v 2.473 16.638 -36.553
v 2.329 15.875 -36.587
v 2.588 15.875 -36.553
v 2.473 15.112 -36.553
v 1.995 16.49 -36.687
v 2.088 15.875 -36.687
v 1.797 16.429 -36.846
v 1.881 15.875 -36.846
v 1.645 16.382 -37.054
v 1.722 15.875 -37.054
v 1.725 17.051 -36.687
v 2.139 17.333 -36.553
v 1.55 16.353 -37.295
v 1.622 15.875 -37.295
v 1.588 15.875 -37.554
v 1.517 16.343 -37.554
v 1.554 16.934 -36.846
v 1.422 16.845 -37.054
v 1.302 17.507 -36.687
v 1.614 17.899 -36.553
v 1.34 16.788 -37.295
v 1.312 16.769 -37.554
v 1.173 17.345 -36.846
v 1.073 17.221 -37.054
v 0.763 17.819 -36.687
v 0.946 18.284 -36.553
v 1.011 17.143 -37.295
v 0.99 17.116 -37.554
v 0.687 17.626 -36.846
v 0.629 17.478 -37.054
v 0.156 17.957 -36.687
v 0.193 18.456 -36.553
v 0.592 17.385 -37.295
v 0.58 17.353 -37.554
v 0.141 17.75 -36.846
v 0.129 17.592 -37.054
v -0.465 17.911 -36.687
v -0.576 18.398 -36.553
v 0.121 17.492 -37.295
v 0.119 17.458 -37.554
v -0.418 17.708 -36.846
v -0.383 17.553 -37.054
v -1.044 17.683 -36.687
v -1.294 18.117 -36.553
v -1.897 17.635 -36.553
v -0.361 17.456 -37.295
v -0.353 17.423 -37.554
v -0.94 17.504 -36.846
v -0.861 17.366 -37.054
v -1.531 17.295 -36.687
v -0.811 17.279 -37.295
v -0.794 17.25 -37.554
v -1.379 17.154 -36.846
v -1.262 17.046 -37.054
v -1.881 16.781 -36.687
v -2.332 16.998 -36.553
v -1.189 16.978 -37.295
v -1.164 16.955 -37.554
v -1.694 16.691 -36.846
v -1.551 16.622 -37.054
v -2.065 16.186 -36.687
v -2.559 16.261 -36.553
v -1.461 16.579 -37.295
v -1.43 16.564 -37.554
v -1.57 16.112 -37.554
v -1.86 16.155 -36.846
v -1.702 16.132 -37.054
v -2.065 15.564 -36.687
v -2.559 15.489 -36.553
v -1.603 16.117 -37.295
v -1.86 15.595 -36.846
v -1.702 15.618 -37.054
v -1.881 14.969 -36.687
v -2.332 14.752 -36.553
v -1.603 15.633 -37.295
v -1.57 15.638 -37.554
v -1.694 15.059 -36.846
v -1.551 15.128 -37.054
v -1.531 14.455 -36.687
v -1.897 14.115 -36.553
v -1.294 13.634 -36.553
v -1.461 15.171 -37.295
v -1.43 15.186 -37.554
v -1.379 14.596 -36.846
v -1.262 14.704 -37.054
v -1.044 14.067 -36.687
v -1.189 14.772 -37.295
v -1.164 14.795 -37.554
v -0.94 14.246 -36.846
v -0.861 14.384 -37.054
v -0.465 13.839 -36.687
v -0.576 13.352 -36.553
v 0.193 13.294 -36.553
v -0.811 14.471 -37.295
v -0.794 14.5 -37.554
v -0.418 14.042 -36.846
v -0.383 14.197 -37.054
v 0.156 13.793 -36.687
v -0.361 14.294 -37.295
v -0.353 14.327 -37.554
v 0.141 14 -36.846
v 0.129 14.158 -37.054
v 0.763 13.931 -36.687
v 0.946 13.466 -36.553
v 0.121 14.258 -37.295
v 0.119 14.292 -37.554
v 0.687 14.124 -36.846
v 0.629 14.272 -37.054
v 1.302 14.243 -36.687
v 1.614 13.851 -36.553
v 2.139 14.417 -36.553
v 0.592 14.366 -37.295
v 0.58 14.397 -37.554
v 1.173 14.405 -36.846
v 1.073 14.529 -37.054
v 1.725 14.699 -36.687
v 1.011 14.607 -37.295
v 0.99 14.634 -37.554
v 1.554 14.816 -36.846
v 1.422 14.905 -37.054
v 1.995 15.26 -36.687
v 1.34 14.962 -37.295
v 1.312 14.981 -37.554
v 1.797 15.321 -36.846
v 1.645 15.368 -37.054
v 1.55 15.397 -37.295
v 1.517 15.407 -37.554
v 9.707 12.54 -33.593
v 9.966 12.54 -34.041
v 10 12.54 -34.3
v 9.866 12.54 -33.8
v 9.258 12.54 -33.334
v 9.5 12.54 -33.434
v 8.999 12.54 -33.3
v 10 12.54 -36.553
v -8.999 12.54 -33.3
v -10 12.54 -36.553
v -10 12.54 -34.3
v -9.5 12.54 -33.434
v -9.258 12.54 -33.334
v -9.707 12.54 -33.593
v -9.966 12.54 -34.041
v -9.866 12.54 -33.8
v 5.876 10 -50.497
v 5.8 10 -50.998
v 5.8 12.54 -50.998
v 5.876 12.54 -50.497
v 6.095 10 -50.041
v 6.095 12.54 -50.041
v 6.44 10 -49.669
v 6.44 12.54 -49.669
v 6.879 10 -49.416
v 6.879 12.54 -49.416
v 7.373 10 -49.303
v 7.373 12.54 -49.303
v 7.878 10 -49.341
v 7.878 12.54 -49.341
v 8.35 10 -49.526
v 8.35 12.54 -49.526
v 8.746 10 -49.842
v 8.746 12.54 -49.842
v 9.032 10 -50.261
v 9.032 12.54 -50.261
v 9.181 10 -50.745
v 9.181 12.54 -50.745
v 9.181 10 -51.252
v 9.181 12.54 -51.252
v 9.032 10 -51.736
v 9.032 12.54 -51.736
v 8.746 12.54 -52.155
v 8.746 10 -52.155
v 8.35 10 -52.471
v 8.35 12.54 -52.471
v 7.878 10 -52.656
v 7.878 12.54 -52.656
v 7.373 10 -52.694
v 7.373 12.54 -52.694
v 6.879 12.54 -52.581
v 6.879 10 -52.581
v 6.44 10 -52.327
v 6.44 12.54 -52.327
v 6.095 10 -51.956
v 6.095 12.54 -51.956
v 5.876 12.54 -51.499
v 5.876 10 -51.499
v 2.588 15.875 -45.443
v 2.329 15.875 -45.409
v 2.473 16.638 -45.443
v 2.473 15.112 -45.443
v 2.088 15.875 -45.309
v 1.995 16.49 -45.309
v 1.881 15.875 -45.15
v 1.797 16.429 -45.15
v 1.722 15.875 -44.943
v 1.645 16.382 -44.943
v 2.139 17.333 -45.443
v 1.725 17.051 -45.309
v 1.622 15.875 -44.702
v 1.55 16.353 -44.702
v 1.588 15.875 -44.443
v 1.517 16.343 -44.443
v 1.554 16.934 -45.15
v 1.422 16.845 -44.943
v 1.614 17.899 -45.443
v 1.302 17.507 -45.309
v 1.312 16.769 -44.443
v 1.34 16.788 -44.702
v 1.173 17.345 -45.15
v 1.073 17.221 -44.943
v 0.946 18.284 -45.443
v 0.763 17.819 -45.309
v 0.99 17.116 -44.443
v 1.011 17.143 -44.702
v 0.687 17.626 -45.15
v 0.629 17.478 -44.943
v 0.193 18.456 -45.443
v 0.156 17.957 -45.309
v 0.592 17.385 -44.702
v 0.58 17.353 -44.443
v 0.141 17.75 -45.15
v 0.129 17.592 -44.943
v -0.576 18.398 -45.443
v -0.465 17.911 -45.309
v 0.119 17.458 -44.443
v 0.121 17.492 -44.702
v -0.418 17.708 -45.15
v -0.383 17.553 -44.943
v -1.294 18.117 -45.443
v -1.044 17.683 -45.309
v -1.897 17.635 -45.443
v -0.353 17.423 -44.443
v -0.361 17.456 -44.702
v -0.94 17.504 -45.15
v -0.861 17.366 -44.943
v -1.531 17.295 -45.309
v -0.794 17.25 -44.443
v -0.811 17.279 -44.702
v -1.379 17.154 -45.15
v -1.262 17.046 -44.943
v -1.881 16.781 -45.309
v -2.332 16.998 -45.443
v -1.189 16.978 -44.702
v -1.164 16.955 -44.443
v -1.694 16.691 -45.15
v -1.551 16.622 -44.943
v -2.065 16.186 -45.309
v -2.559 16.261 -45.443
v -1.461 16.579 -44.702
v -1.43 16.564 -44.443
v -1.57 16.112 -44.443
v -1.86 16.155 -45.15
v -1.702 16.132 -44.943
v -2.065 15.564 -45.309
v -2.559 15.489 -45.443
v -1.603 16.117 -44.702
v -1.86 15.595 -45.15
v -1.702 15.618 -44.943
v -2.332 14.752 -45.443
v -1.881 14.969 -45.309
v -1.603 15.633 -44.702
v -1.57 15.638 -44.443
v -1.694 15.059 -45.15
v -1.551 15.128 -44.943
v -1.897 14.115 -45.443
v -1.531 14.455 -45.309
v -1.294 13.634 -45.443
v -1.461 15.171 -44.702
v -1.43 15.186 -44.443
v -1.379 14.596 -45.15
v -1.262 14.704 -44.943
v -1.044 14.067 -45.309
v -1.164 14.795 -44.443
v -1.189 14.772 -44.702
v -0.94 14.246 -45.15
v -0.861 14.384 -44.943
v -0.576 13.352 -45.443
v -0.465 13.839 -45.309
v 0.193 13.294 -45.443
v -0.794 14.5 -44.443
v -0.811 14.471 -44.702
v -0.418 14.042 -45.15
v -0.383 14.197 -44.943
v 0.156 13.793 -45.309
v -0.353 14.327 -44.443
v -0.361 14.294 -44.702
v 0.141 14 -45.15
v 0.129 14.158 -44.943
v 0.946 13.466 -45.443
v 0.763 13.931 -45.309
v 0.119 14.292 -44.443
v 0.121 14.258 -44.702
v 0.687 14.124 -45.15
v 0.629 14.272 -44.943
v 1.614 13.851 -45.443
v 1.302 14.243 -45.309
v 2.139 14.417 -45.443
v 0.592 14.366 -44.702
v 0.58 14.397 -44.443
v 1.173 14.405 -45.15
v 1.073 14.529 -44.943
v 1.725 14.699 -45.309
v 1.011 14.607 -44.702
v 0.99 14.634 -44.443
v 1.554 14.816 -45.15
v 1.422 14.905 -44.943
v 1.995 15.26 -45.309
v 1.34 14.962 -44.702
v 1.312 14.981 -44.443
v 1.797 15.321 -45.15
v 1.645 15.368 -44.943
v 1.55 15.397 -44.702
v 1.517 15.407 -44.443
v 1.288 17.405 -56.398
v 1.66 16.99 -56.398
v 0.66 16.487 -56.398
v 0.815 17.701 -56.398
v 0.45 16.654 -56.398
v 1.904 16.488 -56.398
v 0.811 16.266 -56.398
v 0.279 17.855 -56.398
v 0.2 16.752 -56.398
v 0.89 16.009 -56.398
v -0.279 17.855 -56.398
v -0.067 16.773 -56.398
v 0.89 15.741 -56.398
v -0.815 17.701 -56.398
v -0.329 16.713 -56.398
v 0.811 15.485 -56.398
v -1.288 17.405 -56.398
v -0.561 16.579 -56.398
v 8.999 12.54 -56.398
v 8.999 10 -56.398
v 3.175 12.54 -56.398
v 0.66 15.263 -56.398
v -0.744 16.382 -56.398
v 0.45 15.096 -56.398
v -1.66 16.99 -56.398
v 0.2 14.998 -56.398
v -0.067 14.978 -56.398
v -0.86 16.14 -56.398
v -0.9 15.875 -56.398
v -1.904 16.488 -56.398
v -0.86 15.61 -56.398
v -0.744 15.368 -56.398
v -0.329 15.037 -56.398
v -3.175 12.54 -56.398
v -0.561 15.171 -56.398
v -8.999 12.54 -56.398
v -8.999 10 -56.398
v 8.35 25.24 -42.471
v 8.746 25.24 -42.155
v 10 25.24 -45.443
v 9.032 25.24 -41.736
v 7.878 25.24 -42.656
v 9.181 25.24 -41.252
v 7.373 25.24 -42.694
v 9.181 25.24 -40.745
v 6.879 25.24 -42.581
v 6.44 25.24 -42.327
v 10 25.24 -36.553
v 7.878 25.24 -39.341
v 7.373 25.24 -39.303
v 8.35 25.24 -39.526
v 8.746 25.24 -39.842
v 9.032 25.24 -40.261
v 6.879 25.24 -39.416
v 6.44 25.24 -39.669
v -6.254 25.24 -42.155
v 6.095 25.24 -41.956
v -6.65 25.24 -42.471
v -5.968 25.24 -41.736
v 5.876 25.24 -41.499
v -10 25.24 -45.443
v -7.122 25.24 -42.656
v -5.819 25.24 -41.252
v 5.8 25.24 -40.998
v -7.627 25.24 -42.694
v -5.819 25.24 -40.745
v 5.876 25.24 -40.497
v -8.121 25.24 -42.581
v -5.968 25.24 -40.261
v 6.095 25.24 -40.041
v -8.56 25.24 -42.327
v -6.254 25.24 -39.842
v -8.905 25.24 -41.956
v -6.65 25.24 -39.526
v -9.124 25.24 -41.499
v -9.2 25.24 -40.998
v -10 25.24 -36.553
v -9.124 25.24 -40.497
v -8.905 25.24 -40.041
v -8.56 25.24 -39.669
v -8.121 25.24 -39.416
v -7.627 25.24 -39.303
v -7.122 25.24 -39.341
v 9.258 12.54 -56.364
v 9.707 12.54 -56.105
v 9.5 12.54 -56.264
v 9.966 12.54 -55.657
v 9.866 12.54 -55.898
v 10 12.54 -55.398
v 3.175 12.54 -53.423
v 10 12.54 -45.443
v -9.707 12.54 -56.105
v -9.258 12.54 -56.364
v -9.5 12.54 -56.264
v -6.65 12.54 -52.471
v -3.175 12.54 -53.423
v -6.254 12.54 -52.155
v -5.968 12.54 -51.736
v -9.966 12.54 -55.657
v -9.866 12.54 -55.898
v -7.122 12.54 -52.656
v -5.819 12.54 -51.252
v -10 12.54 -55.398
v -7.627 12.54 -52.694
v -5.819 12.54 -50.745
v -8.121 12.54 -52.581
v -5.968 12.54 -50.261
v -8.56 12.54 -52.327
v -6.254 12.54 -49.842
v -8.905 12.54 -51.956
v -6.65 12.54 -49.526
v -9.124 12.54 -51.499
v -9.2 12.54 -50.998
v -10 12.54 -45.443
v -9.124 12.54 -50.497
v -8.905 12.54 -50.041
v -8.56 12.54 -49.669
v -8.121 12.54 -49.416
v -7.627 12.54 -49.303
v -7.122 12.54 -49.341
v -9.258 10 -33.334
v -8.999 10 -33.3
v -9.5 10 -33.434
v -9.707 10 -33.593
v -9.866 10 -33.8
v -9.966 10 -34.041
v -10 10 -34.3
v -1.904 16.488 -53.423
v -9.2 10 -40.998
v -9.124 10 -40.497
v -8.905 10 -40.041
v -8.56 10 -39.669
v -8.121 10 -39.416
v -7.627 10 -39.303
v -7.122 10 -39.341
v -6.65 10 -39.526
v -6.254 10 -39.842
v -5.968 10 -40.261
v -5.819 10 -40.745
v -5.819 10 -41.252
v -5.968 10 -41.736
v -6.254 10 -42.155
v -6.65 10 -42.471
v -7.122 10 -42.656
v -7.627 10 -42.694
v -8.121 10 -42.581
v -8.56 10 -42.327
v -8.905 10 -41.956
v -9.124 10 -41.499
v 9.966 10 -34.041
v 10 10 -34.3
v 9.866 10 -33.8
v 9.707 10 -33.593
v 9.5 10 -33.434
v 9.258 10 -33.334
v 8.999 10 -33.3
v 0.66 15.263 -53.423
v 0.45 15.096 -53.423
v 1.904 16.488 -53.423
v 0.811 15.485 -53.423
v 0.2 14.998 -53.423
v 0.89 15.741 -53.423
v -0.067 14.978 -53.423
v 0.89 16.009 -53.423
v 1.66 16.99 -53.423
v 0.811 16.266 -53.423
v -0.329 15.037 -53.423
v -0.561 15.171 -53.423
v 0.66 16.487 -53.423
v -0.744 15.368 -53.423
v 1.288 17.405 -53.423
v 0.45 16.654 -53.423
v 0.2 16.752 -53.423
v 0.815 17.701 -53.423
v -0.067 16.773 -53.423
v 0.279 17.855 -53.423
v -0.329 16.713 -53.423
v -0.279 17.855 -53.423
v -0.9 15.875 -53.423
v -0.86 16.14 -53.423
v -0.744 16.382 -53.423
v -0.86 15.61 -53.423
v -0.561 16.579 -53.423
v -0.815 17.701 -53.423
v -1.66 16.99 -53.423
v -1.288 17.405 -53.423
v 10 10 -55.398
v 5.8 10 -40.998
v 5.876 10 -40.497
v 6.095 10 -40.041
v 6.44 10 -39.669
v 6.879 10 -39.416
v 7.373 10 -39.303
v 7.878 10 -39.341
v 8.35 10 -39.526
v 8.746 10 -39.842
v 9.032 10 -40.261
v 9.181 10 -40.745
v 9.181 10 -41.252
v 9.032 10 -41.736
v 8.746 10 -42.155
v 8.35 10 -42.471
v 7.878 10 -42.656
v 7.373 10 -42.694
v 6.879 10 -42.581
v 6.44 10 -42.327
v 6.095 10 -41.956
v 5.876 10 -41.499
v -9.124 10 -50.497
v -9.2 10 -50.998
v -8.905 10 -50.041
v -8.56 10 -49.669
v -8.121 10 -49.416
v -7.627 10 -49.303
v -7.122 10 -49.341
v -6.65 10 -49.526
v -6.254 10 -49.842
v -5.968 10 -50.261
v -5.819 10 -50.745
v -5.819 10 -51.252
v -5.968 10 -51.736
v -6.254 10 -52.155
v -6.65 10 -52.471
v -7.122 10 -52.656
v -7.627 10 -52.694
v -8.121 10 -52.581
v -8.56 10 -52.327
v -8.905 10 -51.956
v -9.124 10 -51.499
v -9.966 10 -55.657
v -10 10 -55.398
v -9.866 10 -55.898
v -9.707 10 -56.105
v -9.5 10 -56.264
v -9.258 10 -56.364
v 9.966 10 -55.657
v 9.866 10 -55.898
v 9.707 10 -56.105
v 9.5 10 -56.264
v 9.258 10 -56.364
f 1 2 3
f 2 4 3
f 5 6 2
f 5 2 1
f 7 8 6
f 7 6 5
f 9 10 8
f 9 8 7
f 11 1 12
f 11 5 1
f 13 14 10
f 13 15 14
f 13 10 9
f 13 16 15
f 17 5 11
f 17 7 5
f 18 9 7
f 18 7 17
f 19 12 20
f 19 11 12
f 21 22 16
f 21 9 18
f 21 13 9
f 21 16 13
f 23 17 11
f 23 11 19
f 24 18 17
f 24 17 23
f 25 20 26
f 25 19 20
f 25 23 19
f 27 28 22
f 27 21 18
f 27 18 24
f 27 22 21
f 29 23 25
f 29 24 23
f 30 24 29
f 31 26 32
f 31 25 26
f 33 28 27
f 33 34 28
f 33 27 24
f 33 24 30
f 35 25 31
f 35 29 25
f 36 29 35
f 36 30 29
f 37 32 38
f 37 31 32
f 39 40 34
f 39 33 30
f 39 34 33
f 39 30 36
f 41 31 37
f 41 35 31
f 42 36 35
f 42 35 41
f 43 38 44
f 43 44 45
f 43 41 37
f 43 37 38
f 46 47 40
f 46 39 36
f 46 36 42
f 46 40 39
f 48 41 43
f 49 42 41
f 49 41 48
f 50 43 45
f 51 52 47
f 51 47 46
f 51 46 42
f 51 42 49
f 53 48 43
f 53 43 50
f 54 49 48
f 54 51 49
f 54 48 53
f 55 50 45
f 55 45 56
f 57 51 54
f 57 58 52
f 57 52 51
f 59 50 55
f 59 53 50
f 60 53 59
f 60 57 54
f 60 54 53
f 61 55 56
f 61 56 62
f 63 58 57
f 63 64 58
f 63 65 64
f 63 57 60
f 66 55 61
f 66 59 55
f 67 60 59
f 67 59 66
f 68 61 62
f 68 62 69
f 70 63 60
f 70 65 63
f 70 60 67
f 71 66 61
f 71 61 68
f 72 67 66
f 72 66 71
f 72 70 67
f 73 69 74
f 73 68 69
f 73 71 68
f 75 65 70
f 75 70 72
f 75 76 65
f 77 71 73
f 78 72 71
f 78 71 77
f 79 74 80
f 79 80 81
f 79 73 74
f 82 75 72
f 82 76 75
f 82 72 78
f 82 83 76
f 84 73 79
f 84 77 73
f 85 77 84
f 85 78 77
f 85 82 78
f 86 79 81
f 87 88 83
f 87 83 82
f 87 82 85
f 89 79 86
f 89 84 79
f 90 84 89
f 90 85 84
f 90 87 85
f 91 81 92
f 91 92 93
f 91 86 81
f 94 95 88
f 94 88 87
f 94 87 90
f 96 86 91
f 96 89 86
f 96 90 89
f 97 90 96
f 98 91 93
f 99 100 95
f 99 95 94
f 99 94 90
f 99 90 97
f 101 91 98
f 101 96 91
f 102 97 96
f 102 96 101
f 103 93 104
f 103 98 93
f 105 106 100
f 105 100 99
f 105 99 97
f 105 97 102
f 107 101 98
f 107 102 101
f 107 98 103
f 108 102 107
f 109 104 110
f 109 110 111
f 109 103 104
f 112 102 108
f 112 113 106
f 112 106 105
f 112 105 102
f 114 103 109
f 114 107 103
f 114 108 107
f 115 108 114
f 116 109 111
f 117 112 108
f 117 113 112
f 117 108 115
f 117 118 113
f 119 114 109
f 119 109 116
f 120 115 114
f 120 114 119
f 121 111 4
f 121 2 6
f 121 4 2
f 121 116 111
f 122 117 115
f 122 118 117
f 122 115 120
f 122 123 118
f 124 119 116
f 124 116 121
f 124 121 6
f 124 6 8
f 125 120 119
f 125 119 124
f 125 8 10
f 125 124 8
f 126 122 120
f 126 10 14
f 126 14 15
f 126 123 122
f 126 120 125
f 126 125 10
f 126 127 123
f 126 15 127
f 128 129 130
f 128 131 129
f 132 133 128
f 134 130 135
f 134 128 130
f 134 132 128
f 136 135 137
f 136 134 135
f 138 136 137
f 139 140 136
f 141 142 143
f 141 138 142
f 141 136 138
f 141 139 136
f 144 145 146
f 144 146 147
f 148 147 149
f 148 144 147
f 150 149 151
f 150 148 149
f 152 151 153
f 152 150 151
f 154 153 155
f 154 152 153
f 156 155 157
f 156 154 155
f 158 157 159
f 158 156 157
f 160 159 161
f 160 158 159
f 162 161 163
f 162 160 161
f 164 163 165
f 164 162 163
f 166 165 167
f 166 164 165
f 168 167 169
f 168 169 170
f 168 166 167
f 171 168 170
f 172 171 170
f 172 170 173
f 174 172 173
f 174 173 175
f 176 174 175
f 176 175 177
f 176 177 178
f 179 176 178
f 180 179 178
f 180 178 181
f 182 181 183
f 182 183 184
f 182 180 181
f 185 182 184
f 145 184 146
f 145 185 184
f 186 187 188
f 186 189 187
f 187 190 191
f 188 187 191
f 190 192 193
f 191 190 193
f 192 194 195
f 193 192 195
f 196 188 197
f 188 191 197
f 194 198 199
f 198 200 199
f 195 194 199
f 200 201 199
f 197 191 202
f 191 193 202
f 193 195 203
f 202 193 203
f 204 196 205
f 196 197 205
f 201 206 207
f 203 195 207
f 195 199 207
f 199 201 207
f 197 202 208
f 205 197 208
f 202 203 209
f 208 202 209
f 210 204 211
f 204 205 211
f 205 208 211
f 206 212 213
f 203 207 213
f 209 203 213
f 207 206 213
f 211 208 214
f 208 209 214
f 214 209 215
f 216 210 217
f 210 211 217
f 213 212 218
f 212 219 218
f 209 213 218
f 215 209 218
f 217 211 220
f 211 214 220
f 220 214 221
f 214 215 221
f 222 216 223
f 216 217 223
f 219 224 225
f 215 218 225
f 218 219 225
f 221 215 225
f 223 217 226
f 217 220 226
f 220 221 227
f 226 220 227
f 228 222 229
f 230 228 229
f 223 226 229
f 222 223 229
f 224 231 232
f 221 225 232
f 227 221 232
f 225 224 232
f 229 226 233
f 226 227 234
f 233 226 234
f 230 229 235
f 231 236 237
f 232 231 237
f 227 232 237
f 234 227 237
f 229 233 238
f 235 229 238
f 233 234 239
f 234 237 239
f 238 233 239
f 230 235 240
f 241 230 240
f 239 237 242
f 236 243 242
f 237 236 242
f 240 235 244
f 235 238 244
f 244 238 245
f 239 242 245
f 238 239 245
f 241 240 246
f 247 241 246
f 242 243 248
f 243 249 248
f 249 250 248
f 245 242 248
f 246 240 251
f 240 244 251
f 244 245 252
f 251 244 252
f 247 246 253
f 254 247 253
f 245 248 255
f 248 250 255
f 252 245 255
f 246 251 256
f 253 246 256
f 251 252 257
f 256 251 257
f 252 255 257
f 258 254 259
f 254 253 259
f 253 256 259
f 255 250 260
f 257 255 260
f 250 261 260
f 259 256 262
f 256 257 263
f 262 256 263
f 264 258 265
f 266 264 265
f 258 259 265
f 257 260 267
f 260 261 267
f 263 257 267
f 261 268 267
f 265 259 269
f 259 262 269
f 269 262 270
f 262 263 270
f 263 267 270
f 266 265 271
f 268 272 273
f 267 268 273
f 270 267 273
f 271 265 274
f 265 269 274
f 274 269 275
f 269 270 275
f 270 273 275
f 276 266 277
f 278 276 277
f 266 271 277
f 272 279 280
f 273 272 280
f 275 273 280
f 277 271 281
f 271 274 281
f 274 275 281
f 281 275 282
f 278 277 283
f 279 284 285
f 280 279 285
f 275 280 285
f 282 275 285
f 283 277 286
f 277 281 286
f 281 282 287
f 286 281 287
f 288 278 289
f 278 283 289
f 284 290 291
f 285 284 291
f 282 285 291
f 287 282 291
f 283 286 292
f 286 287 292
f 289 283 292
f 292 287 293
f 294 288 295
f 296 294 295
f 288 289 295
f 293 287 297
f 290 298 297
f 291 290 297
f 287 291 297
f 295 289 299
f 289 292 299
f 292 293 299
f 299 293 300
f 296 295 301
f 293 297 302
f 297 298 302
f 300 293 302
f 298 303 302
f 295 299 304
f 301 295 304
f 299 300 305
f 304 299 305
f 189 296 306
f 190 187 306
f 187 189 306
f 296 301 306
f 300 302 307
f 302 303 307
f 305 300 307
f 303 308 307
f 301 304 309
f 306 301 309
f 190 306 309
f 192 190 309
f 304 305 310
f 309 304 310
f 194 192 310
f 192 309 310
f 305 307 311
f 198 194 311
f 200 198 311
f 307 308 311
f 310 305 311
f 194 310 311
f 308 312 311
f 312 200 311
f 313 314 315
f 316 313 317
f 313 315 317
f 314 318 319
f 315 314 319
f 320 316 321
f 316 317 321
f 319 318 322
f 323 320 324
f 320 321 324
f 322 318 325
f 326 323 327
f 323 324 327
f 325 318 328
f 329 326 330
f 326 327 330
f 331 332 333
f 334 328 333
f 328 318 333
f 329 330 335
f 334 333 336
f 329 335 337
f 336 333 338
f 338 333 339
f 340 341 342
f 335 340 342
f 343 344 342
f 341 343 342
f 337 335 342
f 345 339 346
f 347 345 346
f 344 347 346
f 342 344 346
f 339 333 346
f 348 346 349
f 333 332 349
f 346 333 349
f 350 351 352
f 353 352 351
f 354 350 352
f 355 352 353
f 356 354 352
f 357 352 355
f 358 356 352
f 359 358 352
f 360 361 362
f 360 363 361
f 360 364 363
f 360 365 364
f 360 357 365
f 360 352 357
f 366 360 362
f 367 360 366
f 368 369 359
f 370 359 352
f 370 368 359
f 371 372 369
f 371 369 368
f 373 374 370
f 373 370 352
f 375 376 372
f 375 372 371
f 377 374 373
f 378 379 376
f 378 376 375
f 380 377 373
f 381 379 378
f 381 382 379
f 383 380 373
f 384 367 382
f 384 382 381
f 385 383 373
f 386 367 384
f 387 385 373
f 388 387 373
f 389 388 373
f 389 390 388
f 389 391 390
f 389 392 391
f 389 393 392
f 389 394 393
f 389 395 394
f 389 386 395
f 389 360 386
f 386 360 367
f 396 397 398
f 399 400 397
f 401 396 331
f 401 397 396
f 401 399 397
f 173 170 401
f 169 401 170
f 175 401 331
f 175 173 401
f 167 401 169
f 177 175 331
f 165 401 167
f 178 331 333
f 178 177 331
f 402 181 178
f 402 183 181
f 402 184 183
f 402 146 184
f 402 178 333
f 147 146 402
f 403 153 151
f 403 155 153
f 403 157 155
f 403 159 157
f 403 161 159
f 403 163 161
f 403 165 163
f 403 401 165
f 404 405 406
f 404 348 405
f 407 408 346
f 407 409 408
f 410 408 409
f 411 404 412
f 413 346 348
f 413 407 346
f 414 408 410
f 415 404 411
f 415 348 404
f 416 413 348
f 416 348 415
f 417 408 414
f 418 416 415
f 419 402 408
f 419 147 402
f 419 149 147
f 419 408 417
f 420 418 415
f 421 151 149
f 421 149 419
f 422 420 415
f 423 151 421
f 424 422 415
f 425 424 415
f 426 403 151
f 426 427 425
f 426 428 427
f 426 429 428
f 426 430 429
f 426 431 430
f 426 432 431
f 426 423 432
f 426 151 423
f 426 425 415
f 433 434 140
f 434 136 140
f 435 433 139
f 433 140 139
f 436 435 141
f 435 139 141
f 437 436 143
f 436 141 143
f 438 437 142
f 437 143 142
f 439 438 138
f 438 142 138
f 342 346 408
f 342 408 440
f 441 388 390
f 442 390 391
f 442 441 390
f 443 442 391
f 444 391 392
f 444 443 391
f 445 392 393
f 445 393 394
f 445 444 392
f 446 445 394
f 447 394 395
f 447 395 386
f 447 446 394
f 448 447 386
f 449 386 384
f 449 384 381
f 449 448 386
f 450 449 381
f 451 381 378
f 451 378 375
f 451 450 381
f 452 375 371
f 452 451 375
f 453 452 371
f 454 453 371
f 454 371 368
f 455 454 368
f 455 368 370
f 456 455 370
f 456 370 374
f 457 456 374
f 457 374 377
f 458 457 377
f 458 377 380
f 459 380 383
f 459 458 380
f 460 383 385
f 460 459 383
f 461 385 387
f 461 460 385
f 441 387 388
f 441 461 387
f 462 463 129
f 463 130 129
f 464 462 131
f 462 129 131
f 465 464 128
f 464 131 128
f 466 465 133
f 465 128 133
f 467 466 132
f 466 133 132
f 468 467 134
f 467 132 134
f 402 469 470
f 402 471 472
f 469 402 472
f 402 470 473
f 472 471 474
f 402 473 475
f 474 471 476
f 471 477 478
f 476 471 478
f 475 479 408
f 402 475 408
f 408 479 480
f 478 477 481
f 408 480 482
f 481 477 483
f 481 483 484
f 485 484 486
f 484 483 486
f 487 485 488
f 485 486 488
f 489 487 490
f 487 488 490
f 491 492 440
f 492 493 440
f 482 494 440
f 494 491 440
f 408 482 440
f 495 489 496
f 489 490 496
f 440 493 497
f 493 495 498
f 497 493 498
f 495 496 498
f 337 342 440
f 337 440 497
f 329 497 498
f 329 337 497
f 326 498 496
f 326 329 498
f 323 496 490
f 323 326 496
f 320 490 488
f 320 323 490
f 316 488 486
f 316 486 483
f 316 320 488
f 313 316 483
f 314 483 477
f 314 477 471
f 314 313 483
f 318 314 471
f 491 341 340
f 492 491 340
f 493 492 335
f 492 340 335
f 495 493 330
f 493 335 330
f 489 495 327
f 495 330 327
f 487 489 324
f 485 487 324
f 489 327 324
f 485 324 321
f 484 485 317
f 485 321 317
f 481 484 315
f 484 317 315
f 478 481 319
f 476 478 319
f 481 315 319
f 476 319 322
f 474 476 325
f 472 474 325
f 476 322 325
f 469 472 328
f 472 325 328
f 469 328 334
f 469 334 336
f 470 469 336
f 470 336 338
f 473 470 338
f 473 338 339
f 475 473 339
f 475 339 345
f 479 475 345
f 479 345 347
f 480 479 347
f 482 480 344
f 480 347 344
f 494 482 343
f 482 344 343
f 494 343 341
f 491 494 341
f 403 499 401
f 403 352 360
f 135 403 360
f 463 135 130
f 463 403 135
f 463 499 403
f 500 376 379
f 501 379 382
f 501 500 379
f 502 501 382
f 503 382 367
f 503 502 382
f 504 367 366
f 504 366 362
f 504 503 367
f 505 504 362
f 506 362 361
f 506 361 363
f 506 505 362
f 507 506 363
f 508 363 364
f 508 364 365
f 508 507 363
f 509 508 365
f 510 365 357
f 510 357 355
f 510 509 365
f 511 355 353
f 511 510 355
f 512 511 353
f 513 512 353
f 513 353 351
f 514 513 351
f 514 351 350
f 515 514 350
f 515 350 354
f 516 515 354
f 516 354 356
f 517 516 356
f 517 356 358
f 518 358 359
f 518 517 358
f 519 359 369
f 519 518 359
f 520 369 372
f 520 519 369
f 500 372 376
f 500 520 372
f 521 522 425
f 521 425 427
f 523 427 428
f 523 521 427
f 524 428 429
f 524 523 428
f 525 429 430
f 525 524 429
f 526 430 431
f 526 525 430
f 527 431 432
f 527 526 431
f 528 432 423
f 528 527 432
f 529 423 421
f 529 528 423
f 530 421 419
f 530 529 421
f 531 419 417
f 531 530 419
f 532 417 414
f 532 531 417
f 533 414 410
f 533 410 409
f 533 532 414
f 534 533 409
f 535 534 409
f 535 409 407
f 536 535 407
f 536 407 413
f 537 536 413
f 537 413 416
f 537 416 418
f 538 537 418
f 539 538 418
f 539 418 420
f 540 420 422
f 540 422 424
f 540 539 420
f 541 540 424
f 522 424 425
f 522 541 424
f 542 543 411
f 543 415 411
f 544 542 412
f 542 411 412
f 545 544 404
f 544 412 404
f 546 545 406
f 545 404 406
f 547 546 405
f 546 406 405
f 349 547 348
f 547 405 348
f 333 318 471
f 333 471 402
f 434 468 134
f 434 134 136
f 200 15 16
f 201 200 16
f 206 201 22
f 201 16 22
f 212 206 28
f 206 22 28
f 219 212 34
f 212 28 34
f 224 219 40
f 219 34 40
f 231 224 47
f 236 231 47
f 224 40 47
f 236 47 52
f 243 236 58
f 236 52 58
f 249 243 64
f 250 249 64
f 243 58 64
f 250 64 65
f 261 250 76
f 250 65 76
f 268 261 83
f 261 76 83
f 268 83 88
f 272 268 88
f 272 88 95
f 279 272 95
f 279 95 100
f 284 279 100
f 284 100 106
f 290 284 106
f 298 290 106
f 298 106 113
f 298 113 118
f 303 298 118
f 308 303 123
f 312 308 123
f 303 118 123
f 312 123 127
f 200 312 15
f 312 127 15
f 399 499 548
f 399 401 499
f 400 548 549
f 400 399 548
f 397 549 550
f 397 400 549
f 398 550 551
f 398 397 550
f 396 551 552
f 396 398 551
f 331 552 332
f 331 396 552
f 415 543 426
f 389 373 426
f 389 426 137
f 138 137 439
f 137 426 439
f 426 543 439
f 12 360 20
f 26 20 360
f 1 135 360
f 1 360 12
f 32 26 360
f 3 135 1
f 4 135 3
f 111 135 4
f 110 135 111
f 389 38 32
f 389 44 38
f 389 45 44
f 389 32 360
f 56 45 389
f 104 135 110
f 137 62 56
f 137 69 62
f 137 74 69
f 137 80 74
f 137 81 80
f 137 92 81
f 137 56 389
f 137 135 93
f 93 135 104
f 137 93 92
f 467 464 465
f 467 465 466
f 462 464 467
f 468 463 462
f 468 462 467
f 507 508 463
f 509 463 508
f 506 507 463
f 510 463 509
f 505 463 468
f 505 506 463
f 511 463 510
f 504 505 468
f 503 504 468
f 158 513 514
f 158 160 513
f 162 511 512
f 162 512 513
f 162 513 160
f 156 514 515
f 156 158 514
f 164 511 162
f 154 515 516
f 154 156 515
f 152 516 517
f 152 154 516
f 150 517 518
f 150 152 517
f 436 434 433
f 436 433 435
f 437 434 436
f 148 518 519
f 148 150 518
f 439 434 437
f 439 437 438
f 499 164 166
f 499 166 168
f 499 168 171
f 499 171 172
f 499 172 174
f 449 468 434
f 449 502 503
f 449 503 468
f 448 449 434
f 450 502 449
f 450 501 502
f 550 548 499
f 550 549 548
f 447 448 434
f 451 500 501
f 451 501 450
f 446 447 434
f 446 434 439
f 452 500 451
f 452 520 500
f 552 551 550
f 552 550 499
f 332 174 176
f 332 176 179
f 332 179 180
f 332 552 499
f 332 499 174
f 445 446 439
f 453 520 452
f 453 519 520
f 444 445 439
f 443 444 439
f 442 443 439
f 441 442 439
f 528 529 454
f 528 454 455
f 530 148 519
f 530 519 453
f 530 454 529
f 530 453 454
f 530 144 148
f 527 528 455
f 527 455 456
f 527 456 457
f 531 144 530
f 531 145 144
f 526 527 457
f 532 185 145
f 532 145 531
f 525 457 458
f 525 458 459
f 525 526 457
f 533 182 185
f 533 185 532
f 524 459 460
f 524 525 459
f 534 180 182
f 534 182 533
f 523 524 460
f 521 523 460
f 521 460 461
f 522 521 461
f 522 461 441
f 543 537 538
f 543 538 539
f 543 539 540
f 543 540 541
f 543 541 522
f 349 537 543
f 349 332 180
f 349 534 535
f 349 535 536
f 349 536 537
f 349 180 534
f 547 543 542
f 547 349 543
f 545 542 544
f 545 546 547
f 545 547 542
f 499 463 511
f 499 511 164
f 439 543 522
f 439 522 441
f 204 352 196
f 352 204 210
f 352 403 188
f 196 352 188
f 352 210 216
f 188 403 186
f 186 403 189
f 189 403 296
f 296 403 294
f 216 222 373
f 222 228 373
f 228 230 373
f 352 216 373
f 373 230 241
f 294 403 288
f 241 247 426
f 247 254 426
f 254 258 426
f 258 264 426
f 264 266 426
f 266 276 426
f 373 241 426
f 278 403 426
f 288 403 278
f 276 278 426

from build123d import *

# Parameters (mm, degrees)
SKETCH036_W  = 19.99996
SKETCH036_H  = 23.09876
SKETCH036_R  = 1.7
PAD003_DEPTH = 2.54
SKETCH051_W  = 19.99996
SKETCH051_H  = 8.89
SKETCH051_R  = 1.7
PAD_DEPTH    = 12.7
SKETCH050_R  = 0.9
PAD011_DEPTH = 2.975
SKETCH_R     = 1.5875
POCKET_DEPTH = 8.89
FILLET_R     = 1.00076


with BuildPart() as part:
    # Sketch036 → Pad003 (new body)
    with BuildSketch(Plane(origin=(0, 10, -45.999574), x_dir=(-1, 0, 0), z_dir=(0, 1, 0))):
        with Locations((0, 1.15062)):
            Rectangle(SKETCH036_W, SKETCH036_H)
        with Locations((-7.5, 5.00124)):
            Circle(SKETCH036_R, mode=Mode.SUBTRACT)
        with Locations((-7.5, -4.99876)):
            Circle(SKETCH036_R, mode=Mode.SUBTRACT)
        with Locations((7.5, -4.99876)):
            Circle(SKETCH036_R, mode=Mode.SUBTRACT)
        with Locations((7.5, 5.00124)):
            Circle(SKETCH036_R, mode=Mode.SUBTRACT)
    extrude(amount=PAD003_DEPTH)

    # Sketch051 (on Face10 of Pad003) → Pad (join)
    with BuildSketch(Plane(origin=(0, 12.54, -45.999574), x_dir=(-1, 0, 0), z_dir=(0, 1, 0))):
        with Locations((0, 5.00124)):
            Rectangle(SKETCH051_W, SKETCH051_H)
        with Locations((-7.5, 5.00124)):
            Circle(SKETCH051_R, mode=Mode.SUBTRACT)
        with Locations((7.5, 5.00124)):
            Circle(SKETCH051_R, mode=Mode.SUBTRACT)
    extrude(amount=PAD_DEPTH)

    # Sketch050 → Pad011 (join)
    with BuildSketch(Plane(origin=(0, 10, -56.398334), x_dir=(-1, 0, 0), z_dir=(0, 0, -1))):
        with BuildLine():
            Line((-3.175, 2.54), (-3.175, 0))
            Line((-3.175, 0), (3.175, 0))
            Line((3.175, 0), (3.175, 2.54))
            Line((3.175, 2.54), (1.90374, 6.488023))
            ThreePointArc((1.90374, 6.488023), (0, 7.87502), (-1.90374, 6.488023))
            Line((-1.90374, 6.488023), (-3.175, 2.54))
        make_face()
        with Locations((0, 5.87502)):
            Circle(SKETCH050_R, mode=Mode.SUBTRACT)
    extrude(amount=-PAD011_DEPTH)

    # Sketch (on Face16 of Pad011) → Pocket (cut)
    with BuildSketch(Plane(origin=(0, 10, -36.553334), x_dir=(1, 0, 0), z_dir=(0, 0, 1))):
        with Locations((0, 5.87502)):
            Circle(SKETCH_R)
    extrude(amount=-POCKET_DEPTH, mode=Mode.SUBTRACT)

    # Fillet
    fillet_edges = [part.edges().sort_by_distance(p)[0] for p in [
        (-1.5875, 15.87502, -36.553334),
        (-1.5875, 15.87502, -45.443334),
        (9.99998, 11.27, -33.299574),
        (-9.99998, 11.27, -33.299574),
        (9.99998, 11.27, -56.398334),
        (-9.99998, 11.27, -56.398334),
    ]]
    fillet(fillet_edges, radius=FILLET_R)


solid = part.part
